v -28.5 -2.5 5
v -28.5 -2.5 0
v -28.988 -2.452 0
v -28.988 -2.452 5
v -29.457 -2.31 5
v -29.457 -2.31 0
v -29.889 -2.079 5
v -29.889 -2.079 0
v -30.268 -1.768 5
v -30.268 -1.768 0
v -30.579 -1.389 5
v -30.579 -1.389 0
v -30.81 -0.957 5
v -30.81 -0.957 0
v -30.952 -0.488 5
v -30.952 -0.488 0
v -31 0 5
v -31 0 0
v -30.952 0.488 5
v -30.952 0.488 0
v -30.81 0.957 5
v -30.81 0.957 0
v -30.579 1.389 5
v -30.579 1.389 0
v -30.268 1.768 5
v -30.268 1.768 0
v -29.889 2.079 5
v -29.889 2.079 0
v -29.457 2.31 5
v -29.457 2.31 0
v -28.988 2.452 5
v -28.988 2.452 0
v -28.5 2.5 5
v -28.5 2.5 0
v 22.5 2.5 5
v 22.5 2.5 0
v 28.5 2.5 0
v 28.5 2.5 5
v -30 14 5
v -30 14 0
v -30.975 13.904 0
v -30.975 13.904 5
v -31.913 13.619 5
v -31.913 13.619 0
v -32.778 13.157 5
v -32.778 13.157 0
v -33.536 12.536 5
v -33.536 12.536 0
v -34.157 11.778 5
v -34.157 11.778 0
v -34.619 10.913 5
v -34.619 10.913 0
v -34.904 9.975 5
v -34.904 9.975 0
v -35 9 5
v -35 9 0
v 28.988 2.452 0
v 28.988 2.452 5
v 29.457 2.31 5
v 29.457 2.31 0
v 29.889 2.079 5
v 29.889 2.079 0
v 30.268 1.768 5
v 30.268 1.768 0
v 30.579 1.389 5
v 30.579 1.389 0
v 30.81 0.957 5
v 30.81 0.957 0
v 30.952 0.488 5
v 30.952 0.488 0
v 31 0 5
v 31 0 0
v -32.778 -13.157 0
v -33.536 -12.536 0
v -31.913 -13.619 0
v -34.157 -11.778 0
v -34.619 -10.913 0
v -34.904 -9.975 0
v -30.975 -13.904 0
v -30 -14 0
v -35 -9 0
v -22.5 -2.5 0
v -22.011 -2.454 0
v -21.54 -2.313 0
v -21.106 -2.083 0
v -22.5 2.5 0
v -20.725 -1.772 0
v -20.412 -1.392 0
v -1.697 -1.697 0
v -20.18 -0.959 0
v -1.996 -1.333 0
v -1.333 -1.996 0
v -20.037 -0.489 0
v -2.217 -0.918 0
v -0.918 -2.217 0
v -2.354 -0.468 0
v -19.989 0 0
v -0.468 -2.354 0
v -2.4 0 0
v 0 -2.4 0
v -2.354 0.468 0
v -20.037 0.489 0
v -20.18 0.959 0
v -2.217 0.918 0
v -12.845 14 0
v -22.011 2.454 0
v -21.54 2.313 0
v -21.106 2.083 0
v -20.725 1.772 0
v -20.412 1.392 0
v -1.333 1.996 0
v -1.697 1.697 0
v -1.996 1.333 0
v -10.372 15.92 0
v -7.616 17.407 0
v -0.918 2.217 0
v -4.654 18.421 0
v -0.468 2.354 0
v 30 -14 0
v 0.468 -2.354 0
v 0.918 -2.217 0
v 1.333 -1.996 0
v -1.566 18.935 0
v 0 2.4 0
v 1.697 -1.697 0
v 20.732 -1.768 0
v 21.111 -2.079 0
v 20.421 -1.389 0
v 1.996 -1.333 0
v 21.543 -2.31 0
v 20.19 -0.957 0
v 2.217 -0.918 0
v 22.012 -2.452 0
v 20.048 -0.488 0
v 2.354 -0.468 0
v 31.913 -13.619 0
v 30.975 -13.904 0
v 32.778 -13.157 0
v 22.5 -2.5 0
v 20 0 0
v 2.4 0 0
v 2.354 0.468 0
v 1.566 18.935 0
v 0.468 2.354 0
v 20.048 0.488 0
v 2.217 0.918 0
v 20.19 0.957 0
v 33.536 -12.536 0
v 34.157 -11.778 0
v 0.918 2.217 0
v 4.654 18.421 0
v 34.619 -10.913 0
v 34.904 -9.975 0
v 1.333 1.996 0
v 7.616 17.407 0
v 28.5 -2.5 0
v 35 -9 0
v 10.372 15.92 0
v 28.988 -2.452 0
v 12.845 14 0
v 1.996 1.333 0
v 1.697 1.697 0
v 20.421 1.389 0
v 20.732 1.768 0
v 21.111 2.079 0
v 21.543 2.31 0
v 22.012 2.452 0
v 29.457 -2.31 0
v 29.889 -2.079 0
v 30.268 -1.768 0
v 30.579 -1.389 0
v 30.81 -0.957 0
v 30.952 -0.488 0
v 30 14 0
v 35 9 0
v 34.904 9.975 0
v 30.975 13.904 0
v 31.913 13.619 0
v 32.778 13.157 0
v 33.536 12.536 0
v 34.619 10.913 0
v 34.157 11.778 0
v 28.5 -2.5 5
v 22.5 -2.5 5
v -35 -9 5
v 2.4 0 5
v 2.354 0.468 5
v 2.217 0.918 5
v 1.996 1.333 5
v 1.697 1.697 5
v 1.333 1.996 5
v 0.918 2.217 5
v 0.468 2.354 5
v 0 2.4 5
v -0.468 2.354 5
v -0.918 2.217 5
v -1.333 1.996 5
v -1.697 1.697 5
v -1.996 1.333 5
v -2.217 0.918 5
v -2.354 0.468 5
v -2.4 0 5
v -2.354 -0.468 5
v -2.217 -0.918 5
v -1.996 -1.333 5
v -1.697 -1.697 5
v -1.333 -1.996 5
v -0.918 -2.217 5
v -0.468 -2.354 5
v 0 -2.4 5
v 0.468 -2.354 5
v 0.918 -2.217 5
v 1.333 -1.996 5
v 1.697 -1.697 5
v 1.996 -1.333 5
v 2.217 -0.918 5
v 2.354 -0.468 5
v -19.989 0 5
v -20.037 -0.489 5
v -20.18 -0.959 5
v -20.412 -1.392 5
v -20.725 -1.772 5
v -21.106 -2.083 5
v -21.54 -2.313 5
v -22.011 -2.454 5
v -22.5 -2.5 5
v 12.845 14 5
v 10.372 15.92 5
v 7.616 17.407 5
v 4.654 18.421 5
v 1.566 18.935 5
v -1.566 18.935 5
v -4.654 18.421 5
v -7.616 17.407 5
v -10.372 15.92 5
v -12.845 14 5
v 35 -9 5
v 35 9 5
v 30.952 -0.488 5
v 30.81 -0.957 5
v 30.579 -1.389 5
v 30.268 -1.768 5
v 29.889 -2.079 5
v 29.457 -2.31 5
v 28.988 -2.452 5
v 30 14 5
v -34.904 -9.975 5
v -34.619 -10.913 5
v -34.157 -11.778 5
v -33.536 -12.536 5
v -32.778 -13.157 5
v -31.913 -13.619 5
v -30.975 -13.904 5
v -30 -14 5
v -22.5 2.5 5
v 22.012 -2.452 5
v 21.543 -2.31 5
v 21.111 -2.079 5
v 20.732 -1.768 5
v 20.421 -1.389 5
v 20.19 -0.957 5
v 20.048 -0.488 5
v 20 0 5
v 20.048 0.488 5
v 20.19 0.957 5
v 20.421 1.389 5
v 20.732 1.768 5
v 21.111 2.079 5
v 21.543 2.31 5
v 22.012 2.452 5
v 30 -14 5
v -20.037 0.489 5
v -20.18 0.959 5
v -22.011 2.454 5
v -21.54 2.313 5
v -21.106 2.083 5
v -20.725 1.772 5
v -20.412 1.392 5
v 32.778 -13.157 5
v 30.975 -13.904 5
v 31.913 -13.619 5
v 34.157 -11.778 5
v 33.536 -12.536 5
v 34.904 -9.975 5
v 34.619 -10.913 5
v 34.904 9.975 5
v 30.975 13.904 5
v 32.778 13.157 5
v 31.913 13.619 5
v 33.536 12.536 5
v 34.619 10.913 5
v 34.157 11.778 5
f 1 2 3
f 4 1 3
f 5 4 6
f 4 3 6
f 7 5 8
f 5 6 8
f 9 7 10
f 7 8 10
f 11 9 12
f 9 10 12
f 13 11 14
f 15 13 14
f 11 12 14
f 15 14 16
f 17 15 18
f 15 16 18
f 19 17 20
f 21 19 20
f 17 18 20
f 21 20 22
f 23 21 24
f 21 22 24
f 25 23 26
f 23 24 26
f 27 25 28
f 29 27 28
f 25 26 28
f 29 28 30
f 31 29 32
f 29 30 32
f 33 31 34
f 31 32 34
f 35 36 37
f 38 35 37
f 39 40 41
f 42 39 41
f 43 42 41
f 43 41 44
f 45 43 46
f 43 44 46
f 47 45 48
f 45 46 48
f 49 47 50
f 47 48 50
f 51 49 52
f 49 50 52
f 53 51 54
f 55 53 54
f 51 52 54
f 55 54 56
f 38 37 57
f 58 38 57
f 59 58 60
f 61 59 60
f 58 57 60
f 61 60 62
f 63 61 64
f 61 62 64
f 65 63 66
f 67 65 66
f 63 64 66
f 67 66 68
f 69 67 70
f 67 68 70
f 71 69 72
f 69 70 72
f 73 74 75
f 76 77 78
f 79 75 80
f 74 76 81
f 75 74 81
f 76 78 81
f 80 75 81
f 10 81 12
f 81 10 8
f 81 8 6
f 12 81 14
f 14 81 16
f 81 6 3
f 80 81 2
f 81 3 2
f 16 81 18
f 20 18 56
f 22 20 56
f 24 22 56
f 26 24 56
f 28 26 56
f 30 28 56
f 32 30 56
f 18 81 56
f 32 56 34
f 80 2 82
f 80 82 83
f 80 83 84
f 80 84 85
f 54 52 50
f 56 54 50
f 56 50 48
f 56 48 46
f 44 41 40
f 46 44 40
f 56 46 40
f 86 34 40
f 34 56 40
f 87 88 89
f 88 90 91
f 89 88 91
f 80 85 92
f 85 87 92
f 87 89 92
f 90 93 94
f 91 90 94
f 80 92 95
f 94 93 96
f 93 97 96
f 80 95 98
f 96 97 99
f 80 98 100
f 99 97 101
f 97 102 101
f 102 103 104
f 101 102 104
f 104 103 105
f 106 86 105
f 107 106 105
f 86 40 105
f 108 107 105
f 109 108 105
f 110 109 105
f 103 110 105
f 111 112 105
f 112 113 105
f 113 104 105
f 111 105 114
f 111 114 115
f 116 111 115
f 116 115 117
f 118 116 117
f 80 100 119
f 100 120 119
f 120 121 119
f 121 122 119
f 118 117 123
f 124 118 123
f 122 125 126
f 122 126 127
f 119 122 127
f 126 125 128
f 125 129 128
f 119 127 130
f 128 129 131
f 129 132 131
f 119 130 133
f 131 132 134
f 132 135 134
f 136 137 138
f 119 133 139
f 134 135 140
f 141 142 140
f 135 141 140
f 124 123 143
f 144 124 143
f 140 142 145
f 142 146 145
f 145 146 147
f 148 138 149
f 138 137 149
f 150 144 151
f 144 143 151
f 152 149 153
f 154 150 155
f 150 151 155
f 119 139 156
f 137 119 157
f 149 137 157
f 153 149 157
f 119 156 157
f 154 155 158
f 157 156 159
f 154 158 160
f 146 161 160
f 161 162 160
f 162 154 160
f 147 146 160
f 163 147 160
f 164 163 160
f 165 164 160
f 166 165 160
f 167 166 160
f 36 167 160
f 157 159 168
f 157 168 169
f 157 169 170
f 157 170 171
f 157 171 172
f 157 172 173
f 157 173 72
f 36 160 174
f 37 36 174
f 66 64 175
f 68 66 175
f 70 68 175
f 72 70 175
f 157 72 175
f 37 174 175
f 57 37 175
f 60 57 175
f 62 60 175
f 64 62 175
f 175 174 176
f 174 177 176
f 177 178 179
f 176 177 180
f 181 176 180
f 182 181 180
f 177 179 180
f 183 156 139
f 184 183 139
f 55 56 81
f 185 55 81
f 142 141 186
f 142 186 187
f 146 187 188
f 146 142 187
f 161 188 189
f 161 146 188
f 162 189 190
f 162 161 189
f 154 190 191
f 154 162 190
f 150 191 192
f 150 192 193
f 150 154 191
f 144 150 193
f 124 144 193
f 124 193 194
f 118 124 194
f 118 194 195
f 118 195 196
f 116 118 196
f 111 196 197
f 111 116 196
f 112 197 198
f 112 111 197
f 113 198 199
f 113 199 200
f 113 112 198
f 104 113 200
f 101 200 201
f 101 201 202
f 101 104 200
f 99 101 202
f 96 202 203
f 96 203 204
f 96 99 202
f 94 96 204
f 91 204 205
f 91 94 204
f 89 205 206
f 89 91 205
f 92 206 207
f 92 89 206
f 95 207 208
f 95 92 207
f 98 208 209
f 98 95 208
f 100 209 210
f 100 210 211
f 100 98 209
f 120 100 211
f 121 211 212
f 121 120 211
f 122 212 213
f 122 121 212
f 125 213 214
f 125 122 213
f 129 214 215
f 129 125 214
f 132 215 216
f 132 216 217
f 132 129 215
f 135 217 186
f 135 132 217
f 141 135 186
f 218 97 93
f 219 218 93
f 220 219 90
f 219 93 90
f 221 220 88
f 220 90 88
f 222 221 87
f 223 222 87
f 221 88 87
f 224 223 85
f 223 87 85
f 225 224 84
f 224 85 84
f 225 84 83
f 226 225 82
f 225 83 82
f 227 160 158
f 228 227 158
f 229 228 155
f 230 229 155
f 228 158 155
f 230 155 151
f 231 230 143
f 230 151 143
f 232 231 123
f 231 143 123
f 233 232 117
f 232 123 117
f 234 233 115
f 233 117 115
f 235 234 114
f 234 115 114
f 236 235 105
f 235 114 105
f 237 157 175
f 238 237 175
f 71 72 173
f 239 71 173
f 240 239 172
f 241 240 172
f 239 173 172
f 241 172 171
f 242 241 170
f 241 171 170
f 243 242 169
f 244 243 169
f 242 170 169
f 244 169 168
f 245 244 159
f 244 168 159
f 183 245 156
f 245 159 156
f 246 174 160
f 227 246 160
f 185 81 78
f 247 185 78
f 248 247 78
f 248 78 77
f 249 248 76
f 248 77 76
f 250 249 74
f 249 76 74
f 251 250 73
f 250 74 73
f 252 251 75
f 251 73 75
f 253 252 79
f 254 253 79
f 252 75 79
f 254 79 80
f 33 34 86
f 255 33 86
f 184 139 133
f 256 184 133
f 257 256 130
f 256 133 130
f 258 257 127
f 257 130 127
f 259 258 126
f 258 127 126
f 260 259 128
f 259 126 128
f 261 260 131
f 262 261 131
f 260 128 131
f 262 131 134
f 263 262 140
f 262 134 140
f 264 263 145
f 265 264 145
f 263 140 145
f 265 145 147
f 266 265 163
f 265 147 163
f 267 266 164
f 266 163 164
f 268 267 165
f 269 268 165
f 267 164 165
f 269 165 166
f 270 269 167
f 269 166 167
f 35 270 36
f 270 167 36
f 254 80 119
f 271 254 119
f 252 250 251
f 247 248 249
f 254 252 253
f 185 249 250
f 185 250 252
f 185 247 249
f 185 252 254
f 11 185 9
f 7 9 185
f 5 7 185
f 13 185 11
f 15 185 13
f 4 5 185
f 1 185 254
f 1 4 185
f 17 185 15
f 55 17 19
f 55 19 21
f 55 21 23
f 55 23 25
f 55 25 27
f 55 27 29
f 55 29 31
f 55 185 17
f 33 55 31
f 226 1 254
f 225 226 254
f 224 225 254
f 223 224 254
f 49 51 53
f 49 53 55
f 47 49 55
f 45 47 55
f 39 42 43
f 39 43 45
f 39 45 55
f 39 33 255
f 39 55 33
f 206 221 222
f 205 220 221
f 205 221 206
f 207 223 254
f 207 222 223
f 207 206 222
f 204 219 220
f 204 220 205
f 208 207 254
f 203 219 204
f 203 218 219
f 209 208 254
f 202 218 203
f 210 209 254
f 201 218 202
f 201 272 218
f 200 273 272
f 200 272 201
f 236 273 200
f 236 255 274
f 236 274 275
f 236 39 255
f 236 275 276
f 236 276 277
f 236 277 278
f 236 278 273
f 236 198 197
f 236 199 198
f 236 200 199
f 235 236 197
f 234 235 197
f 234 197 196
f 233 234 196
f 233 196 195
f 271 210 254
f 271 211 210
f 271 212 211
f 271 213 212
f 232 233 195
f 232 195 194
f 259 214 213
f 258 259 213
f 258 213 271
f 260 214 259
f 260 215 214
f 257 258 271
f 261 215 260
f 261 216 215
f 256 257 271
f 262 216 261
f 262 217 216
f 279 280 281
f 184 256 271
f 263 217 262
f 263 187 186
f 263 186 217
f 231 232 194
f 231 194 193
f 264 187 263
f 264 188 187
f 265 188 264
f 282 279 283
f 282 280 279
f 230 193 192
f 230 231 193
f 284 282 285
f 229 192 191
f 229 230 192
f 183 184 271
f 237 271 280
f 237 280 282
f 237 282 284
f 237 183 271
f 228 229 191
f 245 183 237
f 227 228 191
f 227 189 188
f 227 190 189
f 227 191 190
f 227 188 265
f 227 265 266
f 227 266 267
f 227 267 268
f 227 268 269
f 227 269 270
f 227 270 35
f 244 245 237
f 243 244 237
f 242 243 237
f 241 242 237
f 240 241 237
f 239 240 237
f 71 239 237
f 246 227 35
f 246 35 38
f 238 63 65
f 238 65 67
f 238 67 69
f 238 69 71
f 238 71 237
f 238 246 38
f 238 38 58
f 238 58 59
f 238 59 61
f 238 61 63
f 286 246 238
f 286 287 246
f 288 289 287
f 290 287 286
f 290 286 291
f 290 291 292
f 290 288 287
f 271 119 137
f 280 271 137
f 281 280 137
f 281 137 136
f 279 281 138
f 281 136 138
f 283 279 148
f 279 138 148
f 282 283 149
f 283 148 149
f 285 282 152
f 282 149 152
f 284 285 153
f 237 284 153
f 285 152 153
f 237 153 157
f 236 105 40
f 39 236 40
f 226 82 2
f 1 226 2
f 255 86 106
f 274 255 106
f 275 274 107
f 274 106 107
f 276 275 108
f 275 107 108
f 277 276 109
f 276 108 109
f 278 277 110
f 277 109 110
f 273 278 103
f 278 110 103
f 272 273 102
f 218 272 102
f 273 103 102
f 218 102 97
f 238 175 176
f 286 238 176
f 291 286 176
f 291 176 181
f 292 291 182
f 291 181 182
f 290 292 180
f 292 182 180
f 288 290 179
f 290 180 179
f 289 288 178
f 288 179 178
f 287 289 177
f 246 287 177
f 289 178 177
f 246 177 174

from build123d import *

# Parameters (mm, degrees)
F0_R     = 2.4
F0_W     = 18
F0_H     = 4
F1_DEPTH = 5


# Not quite as in the source:
# - ends of sketch curves that miss each other by under 0.0002 mm in the source are joined


with BuildPart() as f1:
    # F0 (on Top) → F1 (new body)
    with BuildSketch(Plane.XY):
        with BuildLine():
            Line((-12.8452325787, 14), (-30, 14))
            ThreePointArc((-30, 14), (-33.5355339059, 12.5355339059), (-35, 9))
            Line((-35, 9), (-35, -9))
            ThreePointArc((-35, -9), (-33.5355339059, -12.5355339059), (-30, -14))
            Line((-30, -14), (-12.8452325787, -14))
            ThreePointArc((-12.8452325787, -14), (-19, 0), (-12.8452325787, 14))
        make_face()
        with BuildLine():
            ThreePointArc((-28.5, -2.5), (-31, 0), (-28.5, 2.5))
            Line((-28.5, 2.5), (-22.5, 2.5))
            ThreePointArc((-22.5, 2.5), (-20.7249314431, 1.7717582393), (-19.9886980778, 0))
            ThreePointArc((-19.9886980778, 0), (-20.724931484, -1.77175828), (-22.5, -2.4999744532))
            Line((-22.5, -2.4999744532), (-28.5, -2.5))
        make_face(mode=Mode.SUBTRACT)
        with BuildLine():
            Line((12.8452325787, 14), (-12.8452325787, 14))
            ThreePointArc((-12.8452325787, 14), (-19, 0), (-12.8452325787, -14))
            add(Edge.make_bspline(
                [(-9, -10), (-10.2817441929, -11.3333333333), (-11.5634883858, -12.6666666667), (-12.8452325787, -14)],
                knots=[0, 0, 0, 0, 5.5484965156, 5.5484965156, 5.5484965156, 5.5484965156], degree=3))
            Line((-9, -10), (9, -10))
            add(Edge.make_bspline(
                [(9, -10), (10.2817441929, -11.3333333333), (11.5634883858, -12.6666666667), (12.8452325787, -14)],
                knots=[0, 0, 0, 0, 5.5484965156, 5.5484965156, 5.5484965156, 5.5484965156], degree=3))
            ThreePointArc((12.8452325787, -14), (17.393381198, -7.6465868531), (19, 0))
            ThreePointArc((19, 0), (17.393381198, 7.6465868531), (12.8452325787, 14))
        make_face()
        Circle(F0_R, mode=Mode.SUBTRACT)
        with BuildLine():
            ThreePointArc((12.8452325787, 14), (0, 19), (-12.8452325787, 14))
            Line((-12.8452325787, 14), (12.8452325787, 14))
        make_face()
        with BuildLine():
            Line((30, 14), (12.8452325787, 14))
            ThreePointArc((12.8452325787, 14), (17.393381198, 7.6465868531), (19, 0))
            ThreePointArc((19, 0), (17.393381198, -7.6465868531), (12.8452325787, -14))
            Line((12.8452325787, -14), (30, -14))
            ThreePointArc((30, -14), (33.5355339059, -12.5355339059), (35, -9))
            Line((35, -9), (35, 9))
            ThreePointArc((35, 9), (33.5355339059, 12.5355339059), (30, 14))
        make_face()
        with BuildLine():
            ThreePointArc((22.5, -2.5), (20, 0), (22.5, 2.5))
            Line((22.5, 2.5), (28.5, 2.5))
            ThreePointArc((28.5, 2.5), (30.267766953, 1.767766953), (31, 0))
            ThreePointArc((31, 0), (30.267766953, -1.767766953), (28.5, -2.5))
            Line((28.5, -2.5), (22.5, -2.5))
        make_face(mode=Mode.SUBTRACT)
        with Locations((0, -12)):
            Rectangle(F0_W, F0_H)
        with BuildLine():
            add(Edge.make_bspline(
                [(-9, -10), (-10.2817441929, -11.3333333333), (-11.5634883858, -12.6666666667), (-12.8452325787, -14)],
                knots=[0, 0, 0, 0, 5.5484965156, 5.5484965156, 5.5484965156, 5.5484965156], degree=3))
            Line((-12.8452325787, -14), (-9, -14))
            Line((-9, -14), (-9, -10))
        make_face()
        with BuildLine():
            Line((9, -14), (12.8452325787, -14))
            add(Edge.make_bspline(
                [(9, -10), (10.2817441929, -11.3333333333), (11.5634883858, -12.6666666667), (12.8452325787, -14)],
                knots=[0, 0, 0, 0, 5.5484965156, 5.5484965156, 5.5484965156, 5.5484965156], degree=3))
            Line((9, -10), (9, -14))
        make_face()
    extrude(amount=F1_DEPTH)


solid = f1.part
